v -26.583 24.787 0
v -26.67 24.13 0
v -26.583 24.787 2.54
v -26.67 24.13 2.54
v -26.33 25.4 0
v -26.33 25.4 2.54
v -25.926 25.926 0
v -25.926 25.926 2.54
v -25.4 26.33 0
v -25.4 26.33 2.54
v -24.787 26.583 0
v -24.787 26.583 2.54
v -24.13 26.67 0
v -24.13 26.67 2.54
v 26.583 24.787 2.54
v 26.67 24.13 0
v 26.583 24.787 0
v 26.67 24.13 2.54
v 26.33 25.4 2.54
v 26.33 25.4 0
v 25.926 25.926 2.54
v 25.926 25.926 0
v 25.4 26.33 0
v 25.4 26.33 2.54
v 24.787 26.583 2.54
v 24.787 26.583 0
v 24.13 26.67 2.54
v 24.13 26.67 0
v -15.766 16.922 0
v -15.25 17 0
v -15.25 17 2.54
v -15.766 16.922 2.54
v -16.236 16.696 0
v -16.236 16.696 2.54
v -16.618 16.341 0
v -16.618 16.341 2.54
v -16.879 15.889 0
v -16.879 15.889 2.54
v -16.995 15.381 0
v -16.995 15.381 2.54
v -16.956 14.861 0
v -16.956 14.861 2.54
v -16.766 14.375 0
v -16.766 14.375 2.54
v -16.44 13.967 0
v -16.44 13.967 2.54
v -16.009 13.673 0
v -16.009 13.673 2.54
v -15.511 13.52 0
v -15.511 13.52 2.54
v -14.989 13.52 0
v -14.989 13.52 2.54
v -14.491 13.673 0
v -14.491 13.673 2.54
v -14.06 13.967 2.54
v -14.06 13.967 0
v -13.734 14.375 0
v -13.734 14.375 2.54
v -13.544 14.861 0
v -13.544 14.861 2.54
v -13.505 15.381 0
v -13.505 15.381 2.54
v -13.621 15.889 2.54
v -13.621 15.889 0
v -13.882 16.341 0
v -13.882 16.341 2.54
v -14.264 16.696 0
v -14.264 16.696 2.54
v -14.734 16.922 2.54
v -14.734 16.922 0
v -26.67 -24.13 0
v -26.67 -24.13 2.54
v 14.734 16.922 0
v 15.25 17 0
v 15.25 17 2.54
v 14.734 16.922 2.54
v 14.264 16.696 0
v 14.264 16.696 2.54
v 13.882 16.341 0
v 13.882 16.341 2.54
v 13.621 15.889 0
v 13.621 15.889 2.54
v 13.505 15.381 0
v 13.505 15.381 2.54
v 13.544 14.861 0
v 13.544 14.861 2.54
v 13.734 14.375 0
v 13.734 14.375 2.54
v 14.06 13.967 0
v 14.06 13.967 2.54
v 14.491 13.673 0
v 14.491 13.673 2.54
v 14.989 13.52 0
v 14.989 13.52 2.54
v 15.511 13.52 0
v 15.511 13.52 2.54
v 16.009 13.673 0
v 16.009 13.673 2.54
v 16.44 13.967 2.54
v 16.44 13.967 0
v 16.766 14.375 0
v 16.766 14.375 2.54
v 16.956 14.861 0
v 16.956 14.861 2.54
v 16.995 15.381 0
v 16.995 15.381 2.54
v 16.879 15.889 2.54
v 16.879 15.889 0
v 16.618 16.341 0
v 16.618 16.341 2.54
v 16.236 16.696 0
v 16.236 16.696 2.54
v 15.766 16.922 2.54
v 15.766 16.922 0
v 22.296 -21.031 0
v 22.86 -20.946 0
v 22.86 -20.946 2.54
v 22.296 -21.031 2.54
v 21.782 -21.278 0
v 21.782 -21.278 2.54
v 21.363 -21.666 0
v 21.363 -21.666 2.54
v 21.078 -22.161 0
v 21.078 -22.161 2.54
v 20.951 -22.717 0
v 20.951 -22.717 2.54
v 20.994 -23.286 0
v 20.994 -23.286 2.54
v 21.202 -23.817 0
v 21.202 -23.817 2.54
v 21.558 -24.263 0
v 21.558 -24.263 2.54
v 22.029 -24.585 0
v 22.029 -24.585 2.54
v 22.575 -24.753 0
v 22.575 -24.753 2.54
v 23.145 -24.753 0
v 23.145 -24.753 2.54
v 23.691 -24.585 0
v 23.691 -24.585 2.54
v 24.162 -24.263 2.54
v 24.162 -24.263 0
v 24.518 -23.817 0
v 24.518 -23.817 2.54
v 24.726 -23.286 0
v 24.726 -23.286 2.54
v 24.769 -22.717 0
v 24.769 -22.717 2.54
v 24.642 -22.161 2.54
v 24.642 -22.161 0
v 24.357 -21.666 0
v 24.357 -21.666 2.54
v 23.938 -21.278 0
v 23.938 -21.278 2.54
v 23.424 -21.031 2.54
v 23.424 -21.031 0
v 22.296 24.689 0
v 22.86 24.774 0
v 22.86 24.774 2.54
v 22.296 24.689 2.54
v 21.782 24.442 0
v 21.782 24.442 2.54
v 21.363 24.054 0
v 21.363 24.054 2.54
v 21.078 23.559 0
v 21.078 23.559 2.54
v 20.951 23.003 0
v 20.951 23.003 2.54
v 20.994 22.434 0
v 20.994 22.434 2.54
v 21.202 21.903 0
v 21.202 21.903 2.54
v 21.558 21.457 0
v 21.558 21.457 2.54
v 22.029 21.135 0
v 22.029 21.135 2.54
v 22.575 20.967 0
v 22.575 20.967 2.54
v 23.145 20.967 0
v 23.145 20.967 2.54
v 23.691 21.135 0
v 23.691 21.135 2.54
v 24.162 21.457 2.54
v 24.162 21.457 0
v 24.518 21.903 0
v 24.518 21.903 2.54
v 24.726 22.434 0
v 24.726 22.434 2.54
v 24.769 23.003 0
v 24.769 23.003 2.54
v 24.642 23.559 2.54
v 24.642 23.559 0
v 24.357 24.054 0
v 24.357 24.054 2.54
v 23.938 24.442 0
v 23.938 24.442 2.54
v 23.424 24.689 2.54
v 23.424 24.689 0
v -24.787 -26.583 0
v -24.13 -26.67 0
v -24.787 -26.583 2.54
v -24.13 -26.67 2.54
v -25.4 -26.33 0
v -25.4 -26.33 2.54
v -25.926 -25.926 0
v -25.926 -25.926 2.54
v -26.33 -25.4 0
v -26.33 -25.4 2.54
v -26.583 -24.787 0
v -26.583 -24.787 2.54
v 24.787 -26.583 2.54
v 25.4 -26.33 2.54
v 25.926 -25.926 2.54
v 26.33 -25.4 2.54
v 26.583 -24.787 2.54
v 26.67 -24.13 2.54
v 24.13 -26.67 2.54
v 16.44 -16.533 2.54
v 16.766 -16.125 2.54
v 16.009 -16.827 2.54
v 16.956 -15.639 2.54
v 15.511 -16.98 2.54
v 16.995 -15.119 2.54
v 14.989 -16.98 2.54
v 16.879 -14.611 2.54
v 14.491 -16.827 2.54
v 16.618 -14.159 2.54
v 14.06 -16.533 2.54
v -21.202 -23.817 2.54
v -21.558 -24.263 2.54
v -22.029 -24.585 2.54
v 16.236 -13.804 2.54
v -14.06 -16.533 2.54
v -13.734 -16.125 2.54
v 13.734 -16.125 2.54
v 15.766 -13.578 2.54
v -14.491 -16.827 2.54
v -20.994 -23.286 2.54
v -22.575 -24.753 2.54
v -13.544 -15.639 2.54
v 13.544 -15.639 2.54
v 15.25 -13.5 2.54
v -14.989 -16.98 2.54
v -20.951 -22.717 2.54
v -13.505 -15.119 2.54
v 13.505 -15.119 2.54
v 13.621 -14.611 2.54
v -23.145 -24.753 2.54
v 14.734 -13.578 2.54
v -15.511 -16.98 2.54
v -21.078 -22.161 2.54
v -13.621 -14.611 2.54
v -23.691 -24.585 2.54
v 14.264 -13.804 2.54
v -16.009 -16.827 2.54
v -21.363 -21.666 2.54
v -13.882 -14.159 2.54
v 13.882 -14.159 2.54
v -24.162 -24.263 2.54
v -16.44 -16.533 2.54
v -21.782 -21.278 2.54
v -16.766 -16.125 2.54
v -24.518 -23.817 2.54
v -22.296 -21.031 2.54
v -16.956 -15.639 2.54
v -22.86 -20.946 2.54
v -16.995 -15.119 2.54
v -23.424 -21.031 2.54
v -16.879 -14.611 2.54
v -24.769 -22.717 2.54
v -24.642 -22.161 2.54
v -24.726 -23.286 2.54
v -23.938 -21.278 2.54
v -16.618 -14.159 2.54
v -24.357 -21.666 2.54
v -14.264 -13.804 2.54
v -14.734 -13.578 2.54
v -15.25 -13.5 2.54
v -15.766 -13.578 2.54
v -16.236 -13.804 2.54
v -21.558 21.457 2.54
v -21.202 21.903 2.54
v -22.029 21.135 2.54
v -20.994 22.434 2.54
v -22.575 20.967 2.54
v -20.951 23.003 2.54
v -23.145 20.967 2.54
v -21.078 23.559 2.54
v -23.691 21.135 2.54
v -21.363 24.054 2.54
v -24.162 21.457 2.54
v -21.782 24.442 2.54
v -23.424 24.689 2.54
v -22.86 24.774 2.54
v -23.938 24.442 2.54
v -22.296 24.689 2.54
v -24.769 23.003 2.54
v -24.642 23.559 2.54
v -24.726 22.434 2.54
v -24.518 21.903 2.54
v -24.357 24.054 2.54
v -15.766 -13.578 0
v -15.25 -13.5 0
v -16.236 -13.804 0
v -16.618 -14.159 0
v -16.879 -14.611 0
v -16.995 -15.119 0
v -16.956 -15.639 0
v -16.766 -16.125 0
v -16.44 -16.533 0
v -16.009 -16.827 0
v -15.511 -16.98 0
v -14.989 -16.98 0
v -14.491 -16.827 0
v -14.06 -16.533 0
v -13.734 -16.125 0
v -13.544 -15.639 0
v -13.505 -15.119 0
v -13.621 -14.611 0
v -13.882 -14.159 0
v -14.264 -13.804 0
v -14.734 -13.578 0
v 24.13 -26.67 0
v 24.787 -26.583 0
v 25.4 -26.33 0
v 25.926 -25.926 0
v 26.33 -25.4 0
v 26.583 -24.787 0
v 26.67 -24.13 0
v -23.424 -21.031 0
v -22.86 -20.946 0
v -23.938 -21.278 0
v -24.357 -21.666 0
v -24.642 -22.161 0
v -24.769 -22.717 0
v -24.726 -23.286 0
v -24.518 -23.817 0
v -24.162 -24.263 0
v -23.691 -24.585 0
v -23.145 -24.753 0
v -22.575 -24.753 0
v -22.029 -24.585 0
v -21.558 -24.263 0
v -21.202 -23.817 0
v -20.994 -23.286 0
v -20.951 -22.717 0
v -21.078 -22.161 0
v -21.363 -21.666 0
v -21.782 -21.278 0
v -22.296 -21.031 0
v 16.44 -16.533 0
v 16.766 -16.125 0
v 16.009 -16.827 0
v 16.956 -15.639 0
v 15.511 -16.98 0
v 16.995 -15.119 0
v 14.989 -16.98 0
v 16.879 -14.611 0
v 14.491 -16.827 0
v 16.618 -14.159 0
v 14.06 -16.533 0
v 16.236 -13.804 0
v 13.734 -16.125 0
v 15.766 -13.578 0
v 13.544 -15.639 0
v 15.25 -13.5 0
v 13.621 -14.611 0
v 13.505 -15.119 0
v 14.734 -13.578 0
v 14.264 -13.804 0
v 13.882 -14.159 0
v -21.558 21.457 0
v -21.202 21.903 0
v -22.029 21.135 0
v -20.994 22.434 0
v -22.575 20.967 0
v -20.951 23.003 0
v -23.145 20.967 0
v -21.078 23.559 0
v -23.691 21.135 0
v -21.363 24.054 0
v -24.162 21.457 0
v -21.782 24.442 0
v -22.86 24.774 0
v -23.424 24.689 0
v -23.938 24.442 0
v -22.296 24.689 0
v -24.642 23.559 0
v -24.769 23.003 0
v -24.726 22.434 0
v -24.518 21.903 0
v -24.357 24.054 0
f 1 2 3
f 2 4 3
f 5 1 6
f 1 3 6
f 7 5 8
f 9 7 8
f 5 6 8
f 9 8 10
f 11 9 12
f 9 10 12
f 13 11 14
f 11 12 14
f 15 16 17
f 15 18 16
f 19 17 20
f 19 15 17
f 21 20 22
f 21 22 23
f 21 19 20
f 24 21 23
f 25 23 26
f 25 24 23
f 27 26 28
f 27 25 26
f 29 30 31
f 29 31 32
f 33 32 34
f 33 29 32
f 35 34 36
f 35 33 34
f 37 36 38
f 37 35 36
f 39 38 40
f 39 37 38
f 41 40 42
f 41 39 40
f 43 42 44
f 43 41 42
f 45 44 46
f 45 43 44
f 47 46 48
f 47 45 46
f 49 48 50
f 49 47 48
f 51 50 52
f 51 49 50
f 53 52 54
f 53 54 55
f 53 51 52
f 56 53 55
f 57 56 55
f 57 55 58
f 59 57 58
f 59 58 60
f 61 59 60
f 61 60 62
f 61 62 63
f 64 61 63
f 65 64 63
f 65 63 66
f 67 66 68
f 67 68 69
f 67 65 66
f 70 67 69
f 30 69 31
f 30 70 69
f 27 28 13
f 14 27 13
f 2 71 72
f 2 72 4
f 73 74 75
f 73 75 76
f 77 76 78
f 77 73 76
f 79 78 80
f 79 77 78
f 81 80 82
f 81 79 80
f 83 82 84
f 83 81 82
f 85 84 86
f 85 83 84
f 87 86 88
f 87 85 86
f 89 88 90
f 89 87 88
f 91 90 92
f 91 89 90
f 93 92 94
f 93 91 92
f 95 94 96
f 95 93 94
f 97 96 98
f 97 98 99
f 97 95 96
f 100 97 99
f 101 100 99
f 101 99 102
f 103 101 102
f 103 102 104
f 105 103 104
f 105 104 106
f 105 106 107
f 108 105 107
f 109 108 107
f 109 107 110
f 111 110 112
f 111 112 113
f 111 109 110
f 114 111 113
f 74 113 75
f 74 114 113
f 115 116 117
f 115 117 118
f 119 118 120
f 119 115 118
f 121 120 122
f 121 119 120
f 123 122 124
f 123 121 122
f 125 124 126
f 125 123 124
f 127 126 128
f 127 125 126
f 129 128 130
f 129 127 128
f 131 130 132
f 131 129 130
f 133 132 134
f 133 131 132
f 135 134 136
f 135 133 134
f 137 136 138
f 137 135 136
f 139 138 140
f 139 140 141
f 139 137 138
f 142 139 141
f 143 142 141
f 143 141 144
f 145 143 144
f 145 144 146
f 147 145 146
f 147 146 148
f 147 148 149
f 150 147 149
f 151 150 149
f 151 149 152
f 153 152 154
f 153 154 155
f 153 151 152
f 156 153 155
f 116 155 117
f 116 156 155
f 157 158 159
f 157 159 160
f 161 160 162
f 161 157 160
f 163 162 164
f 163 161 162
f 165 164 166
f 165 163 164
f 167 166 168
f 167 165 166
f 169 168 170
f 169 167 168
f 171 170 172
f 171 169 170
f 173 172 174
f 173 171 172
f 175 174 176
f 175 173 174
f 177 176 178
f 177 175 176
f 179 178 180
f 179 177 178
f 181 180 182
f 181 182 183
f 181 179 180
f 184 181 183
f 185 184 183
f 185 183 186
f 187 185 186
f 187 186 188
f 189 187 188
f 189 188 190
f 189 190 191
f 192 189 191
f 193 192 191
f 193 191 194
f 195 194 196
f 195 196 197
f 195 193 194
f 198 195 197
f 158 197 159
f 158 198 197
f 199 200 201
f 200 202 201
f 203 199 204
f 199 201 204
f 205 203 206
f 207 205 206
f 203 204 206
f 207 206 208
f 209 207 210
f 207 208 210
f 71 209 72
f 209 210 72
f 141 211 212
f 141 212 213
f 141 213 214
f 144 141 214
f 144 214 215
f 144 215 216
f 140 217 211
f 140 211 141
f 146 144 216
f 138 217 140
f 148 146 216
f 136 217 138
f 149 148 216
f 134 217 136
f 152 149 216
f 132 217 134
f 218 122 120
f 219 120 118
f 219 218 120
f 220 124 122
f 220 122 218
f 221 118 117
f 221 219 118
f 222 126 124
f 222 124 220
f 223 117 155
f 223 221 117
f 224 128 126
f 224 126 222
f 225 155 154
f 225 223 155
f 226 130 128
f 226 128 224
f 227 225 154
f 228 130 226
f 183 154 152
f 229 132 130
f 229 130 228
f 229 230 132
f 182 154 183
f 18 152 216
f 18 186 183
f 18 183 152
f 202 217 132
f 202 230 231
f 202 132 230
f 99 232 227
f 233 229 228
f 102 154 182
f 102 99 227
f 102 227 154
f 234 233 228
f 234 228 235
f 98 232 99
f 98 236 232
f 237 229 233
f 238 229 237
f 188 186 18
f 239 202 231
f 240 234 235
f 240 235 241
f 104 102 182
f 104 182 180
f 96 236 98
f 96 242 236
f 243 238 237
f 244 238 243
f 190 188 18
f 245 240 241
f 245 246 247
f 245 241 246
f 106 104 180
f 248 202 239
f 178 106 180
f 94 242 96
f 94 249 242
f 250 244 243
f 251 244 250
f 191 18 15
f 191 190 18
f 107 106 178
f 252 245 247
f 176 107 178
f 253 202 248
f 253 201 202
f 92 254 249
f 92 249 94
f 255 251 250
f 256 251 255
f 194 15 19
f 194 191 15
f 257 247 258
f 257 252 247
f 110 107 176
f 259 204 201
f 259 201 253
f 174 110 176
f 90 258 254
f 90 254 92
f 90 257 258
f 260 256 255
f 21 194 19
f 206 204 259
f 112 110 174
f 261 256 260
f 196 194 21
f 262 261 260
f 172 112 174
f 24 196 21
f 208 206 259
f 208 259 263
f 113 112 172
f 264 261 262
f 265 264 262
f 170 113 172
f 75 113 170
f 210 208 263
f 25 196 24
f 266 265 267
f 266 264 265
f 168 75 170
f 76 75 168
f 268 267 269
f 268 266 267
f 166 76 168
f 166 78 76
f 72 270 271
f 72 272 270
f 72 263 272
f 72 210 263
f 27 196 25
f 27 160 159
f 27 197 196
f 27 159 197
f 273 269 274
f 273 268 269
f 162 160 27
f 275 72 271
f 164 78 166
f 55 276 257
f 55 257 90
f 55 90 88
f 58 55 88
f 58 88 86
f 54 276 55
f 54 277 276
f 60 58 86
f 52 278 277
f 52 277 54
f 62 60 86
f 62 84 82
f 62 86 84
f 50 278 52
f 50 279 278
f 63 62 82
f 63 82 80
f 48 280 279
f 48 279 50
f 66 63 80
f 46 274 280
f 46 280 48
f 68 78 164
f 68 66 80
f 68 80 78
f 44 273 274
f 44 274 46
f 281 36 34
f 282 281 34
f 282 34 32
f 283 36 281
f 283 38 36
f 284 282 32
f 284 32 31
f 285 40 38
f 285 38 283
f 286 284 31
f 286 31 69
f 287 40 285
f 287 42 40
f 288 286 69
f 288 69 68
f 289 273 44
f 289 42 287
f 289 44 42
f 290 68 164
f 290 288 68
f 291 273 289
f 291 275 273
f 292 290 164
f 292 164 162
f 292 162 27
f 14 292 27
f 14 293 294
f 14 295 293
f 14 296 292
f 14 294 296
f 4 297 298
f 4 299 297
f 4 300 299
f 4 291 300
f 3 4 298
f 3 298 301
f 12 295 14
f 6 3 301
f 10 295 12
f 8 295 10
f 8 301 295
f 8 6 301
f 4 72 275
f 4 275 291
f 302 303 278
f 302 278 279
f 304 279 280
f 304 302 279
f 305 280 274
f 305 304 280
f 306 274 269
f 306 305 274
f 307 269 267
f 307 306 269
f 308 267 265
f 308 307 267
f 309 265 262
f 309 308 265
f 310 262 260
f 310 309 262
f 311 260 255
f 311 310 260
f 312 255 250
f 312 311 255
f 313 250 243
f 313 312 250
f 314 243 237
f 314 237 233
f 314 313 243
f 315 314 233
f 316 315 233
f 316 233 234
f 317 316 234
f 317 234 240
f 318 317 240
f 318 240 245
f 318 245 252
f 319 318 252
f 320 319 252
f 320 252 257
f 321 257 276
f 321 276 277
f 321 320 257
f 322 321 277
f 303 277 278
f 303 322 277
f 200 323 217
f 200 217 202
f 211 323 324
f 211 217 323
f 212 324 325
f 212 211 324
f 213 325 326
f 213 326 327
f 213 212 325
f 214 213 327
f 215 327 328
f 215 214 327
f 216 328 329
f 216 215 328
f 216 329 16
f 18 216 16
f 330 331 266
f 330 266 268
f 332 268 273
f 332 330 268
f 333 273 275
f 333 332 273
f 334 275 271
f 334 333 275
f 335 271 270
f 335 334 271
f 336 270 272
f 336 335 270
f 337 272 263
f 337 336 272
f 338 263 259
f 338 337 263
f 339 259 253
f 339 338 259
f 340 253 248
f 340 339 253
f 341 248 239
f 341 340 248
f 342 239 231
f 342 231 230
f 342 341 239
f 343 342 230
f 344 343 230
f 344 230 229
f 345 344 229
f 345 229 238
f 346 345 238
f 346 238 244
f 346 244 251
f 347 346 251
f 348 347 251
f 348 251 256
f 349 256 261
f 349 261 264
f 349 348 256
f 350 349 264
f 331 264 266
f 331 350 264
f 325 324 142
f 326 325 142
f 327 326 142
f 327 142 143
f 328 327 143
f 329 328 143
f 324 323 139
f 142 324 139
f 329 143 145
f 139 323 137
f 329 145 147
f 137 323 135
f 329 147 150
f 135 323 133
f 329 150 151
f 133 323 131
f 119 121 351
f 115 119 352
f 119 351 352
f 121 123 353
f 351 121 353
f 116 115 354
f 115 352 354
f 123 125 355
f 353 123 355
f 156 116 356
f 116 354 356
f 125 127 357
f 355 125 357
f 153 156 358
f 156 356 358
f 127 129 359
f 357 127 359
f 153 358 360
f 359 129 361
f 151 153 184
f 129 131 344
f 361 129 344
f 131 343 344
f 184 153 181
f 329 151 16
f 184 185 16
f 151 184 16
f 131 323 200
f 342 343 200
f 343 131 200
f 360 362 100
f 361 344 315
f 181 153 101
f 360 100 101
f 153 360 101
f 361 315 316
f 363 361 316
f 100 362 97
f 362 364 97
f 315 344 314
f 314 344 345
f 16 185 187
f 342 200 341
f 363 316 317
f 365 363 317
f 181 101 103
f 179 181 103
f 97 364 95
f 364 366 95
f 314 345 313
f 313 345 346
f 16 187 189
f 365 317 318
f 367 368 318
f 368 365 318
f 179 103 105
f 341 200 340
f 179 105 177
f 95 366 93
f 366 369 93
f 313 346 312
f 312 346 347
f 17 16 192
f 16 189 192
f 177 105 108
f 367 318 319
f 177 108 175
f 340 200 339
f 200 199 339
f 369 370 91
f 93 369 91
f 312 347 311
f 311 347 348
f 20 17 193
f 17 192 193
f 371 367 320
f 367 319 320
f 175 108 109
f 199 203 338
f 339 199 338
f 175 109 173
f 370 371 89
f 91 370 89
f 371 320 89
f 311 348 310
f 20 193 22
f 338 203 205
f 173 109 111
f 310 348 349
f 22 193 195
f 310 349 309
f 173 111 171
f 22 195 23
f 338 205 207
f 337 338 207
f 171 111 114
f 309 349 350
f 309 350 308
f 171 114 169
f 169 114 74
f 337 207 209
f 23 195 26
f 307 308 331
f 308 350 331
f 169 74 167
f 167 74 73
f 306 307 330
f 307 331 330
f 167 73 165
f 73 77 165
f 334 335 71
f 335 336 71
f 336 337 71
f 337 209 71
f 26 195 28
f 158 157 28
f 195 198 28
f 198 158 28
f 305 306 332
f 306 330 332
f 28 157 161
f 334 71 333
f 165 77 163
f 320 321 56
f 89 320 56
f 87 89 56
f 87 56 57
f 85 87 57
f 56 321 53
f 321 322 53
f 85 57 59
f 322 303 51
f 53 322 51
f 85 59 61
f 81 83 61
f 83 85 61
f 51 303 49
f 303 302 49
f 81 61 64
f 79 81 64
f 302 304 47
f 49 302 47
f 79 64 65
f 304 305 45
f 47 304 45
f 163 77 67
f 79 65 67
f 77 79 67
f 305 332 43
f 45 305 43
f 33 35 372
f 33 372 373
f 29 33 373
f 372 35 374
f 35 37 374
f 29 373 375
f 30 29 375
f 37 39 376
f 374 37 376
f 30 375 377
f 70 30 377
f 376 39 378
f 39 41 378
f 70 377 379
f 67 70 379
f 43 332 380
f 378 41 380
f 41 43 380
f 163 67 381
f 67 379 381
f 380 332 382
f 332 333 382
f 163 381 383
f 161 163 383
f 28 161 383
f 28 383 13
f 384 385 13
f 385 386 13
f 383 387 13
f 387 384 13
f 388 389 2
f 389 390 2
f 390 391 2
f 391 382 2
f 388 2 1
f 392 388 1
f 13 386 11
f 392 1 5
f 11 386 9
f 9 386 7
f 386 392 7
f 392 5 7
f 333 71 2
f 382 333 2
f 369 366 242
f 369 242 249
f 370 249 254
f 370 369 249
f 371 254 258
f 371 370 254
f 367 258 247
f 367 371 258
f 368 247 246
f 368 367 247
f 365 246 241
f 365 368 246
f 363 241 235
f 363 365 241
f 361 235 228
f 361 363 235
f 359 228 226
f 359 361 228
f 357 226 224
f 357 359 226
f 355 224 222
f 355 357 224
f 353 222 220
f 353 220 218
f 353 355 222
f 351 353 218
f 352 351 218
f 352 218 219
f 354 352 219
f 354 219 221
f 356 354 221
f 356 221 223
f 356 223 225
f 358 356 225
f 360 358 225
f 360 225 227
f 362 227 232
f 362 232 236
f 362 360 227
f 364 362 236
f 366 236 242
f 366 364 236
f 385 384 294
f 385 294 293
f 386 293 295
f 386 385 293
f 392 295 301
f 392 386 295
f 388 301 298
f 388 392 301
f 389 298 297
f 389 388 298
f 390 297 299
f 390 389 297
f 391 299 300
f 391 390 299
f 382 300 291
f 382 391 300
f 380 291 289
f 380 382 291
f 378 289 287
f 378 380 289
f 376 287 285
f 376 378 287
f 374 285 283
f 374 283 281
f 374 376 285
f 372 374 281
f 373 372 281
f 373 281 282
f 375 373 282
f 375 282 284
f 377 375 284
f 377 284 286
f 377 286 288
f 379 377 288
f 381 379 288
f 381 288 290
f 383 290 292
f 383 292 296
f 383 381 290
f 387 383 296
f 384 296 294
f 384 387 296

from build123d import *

# Parameters (mm, degrees)
SKETCH1_W           = 53.34
SKETCH1_H           = 53.34
SKETCH1_R           = 1.9145
SKETCH1_R_2         = 1.75
BOSS_EXTRUDE1_DEPTH = 2.54
FILLET1_R           = 2.54


with BuildPart() as part:
    # Sketch1 → Boss-Extrude1 (new body)
    with BuildSketch(Plane(origin=(0, 0, 0), x_dir=(0, 1, 0), z_dir=(0, 0, 1))):
        Rectangle(SKETCH1_W, SKETCH1_H)
        with Locations((-22.86, -22.86)):
            Circle(SKETCH1_R, mode=Mode.SUBTRACT)
        with Locations((22.86, -22.86)):
            Circle(SKETCH1_R, mode=Mode.SUBTRACT)
        with Locations((22.86, 22.86)):
            Circle(SKETCH1_R, mode=Mode.SUBTRACT)
        with Locations((-22.86, 22.86)):
            Circle(SKETCH1_R, mode=Mode.SUBTRACT)
        with Locations((-15.25, 15.25)):
            Circle(SKETCH1_R_2, mode=Mode.SUBTRACT)
        with Locations((15.25, 15.25)):
            Circle(SKETCH1_R_2, mode=Mode.SUBTRACT)
        with Locations((15.25, -15.25)):
            Circle(SKETCH1_R_2, mode=Mode.SUBTRACT)
        with Locations((-15.25, -15.25)):
            Circle(SKETCH1_R_2, mode=Mode.SUBTRACT)
    extrude(amount=BOSS_EXTRUDE1_DEPTH)

    # Fillet1
    fillet1_edges = [part.edges().sort_by_distance(p)[0] for p in [
        (-26.67, -26.67, 1.27),
        (-26.67, 26.67, 1.27),
        (26.67, 26.67, 1.27),
        (26.67, -26.67, 1.27),
    ]]
    fillet(fillet1_edges, radius=FILLET1_R)


solid = part.part
